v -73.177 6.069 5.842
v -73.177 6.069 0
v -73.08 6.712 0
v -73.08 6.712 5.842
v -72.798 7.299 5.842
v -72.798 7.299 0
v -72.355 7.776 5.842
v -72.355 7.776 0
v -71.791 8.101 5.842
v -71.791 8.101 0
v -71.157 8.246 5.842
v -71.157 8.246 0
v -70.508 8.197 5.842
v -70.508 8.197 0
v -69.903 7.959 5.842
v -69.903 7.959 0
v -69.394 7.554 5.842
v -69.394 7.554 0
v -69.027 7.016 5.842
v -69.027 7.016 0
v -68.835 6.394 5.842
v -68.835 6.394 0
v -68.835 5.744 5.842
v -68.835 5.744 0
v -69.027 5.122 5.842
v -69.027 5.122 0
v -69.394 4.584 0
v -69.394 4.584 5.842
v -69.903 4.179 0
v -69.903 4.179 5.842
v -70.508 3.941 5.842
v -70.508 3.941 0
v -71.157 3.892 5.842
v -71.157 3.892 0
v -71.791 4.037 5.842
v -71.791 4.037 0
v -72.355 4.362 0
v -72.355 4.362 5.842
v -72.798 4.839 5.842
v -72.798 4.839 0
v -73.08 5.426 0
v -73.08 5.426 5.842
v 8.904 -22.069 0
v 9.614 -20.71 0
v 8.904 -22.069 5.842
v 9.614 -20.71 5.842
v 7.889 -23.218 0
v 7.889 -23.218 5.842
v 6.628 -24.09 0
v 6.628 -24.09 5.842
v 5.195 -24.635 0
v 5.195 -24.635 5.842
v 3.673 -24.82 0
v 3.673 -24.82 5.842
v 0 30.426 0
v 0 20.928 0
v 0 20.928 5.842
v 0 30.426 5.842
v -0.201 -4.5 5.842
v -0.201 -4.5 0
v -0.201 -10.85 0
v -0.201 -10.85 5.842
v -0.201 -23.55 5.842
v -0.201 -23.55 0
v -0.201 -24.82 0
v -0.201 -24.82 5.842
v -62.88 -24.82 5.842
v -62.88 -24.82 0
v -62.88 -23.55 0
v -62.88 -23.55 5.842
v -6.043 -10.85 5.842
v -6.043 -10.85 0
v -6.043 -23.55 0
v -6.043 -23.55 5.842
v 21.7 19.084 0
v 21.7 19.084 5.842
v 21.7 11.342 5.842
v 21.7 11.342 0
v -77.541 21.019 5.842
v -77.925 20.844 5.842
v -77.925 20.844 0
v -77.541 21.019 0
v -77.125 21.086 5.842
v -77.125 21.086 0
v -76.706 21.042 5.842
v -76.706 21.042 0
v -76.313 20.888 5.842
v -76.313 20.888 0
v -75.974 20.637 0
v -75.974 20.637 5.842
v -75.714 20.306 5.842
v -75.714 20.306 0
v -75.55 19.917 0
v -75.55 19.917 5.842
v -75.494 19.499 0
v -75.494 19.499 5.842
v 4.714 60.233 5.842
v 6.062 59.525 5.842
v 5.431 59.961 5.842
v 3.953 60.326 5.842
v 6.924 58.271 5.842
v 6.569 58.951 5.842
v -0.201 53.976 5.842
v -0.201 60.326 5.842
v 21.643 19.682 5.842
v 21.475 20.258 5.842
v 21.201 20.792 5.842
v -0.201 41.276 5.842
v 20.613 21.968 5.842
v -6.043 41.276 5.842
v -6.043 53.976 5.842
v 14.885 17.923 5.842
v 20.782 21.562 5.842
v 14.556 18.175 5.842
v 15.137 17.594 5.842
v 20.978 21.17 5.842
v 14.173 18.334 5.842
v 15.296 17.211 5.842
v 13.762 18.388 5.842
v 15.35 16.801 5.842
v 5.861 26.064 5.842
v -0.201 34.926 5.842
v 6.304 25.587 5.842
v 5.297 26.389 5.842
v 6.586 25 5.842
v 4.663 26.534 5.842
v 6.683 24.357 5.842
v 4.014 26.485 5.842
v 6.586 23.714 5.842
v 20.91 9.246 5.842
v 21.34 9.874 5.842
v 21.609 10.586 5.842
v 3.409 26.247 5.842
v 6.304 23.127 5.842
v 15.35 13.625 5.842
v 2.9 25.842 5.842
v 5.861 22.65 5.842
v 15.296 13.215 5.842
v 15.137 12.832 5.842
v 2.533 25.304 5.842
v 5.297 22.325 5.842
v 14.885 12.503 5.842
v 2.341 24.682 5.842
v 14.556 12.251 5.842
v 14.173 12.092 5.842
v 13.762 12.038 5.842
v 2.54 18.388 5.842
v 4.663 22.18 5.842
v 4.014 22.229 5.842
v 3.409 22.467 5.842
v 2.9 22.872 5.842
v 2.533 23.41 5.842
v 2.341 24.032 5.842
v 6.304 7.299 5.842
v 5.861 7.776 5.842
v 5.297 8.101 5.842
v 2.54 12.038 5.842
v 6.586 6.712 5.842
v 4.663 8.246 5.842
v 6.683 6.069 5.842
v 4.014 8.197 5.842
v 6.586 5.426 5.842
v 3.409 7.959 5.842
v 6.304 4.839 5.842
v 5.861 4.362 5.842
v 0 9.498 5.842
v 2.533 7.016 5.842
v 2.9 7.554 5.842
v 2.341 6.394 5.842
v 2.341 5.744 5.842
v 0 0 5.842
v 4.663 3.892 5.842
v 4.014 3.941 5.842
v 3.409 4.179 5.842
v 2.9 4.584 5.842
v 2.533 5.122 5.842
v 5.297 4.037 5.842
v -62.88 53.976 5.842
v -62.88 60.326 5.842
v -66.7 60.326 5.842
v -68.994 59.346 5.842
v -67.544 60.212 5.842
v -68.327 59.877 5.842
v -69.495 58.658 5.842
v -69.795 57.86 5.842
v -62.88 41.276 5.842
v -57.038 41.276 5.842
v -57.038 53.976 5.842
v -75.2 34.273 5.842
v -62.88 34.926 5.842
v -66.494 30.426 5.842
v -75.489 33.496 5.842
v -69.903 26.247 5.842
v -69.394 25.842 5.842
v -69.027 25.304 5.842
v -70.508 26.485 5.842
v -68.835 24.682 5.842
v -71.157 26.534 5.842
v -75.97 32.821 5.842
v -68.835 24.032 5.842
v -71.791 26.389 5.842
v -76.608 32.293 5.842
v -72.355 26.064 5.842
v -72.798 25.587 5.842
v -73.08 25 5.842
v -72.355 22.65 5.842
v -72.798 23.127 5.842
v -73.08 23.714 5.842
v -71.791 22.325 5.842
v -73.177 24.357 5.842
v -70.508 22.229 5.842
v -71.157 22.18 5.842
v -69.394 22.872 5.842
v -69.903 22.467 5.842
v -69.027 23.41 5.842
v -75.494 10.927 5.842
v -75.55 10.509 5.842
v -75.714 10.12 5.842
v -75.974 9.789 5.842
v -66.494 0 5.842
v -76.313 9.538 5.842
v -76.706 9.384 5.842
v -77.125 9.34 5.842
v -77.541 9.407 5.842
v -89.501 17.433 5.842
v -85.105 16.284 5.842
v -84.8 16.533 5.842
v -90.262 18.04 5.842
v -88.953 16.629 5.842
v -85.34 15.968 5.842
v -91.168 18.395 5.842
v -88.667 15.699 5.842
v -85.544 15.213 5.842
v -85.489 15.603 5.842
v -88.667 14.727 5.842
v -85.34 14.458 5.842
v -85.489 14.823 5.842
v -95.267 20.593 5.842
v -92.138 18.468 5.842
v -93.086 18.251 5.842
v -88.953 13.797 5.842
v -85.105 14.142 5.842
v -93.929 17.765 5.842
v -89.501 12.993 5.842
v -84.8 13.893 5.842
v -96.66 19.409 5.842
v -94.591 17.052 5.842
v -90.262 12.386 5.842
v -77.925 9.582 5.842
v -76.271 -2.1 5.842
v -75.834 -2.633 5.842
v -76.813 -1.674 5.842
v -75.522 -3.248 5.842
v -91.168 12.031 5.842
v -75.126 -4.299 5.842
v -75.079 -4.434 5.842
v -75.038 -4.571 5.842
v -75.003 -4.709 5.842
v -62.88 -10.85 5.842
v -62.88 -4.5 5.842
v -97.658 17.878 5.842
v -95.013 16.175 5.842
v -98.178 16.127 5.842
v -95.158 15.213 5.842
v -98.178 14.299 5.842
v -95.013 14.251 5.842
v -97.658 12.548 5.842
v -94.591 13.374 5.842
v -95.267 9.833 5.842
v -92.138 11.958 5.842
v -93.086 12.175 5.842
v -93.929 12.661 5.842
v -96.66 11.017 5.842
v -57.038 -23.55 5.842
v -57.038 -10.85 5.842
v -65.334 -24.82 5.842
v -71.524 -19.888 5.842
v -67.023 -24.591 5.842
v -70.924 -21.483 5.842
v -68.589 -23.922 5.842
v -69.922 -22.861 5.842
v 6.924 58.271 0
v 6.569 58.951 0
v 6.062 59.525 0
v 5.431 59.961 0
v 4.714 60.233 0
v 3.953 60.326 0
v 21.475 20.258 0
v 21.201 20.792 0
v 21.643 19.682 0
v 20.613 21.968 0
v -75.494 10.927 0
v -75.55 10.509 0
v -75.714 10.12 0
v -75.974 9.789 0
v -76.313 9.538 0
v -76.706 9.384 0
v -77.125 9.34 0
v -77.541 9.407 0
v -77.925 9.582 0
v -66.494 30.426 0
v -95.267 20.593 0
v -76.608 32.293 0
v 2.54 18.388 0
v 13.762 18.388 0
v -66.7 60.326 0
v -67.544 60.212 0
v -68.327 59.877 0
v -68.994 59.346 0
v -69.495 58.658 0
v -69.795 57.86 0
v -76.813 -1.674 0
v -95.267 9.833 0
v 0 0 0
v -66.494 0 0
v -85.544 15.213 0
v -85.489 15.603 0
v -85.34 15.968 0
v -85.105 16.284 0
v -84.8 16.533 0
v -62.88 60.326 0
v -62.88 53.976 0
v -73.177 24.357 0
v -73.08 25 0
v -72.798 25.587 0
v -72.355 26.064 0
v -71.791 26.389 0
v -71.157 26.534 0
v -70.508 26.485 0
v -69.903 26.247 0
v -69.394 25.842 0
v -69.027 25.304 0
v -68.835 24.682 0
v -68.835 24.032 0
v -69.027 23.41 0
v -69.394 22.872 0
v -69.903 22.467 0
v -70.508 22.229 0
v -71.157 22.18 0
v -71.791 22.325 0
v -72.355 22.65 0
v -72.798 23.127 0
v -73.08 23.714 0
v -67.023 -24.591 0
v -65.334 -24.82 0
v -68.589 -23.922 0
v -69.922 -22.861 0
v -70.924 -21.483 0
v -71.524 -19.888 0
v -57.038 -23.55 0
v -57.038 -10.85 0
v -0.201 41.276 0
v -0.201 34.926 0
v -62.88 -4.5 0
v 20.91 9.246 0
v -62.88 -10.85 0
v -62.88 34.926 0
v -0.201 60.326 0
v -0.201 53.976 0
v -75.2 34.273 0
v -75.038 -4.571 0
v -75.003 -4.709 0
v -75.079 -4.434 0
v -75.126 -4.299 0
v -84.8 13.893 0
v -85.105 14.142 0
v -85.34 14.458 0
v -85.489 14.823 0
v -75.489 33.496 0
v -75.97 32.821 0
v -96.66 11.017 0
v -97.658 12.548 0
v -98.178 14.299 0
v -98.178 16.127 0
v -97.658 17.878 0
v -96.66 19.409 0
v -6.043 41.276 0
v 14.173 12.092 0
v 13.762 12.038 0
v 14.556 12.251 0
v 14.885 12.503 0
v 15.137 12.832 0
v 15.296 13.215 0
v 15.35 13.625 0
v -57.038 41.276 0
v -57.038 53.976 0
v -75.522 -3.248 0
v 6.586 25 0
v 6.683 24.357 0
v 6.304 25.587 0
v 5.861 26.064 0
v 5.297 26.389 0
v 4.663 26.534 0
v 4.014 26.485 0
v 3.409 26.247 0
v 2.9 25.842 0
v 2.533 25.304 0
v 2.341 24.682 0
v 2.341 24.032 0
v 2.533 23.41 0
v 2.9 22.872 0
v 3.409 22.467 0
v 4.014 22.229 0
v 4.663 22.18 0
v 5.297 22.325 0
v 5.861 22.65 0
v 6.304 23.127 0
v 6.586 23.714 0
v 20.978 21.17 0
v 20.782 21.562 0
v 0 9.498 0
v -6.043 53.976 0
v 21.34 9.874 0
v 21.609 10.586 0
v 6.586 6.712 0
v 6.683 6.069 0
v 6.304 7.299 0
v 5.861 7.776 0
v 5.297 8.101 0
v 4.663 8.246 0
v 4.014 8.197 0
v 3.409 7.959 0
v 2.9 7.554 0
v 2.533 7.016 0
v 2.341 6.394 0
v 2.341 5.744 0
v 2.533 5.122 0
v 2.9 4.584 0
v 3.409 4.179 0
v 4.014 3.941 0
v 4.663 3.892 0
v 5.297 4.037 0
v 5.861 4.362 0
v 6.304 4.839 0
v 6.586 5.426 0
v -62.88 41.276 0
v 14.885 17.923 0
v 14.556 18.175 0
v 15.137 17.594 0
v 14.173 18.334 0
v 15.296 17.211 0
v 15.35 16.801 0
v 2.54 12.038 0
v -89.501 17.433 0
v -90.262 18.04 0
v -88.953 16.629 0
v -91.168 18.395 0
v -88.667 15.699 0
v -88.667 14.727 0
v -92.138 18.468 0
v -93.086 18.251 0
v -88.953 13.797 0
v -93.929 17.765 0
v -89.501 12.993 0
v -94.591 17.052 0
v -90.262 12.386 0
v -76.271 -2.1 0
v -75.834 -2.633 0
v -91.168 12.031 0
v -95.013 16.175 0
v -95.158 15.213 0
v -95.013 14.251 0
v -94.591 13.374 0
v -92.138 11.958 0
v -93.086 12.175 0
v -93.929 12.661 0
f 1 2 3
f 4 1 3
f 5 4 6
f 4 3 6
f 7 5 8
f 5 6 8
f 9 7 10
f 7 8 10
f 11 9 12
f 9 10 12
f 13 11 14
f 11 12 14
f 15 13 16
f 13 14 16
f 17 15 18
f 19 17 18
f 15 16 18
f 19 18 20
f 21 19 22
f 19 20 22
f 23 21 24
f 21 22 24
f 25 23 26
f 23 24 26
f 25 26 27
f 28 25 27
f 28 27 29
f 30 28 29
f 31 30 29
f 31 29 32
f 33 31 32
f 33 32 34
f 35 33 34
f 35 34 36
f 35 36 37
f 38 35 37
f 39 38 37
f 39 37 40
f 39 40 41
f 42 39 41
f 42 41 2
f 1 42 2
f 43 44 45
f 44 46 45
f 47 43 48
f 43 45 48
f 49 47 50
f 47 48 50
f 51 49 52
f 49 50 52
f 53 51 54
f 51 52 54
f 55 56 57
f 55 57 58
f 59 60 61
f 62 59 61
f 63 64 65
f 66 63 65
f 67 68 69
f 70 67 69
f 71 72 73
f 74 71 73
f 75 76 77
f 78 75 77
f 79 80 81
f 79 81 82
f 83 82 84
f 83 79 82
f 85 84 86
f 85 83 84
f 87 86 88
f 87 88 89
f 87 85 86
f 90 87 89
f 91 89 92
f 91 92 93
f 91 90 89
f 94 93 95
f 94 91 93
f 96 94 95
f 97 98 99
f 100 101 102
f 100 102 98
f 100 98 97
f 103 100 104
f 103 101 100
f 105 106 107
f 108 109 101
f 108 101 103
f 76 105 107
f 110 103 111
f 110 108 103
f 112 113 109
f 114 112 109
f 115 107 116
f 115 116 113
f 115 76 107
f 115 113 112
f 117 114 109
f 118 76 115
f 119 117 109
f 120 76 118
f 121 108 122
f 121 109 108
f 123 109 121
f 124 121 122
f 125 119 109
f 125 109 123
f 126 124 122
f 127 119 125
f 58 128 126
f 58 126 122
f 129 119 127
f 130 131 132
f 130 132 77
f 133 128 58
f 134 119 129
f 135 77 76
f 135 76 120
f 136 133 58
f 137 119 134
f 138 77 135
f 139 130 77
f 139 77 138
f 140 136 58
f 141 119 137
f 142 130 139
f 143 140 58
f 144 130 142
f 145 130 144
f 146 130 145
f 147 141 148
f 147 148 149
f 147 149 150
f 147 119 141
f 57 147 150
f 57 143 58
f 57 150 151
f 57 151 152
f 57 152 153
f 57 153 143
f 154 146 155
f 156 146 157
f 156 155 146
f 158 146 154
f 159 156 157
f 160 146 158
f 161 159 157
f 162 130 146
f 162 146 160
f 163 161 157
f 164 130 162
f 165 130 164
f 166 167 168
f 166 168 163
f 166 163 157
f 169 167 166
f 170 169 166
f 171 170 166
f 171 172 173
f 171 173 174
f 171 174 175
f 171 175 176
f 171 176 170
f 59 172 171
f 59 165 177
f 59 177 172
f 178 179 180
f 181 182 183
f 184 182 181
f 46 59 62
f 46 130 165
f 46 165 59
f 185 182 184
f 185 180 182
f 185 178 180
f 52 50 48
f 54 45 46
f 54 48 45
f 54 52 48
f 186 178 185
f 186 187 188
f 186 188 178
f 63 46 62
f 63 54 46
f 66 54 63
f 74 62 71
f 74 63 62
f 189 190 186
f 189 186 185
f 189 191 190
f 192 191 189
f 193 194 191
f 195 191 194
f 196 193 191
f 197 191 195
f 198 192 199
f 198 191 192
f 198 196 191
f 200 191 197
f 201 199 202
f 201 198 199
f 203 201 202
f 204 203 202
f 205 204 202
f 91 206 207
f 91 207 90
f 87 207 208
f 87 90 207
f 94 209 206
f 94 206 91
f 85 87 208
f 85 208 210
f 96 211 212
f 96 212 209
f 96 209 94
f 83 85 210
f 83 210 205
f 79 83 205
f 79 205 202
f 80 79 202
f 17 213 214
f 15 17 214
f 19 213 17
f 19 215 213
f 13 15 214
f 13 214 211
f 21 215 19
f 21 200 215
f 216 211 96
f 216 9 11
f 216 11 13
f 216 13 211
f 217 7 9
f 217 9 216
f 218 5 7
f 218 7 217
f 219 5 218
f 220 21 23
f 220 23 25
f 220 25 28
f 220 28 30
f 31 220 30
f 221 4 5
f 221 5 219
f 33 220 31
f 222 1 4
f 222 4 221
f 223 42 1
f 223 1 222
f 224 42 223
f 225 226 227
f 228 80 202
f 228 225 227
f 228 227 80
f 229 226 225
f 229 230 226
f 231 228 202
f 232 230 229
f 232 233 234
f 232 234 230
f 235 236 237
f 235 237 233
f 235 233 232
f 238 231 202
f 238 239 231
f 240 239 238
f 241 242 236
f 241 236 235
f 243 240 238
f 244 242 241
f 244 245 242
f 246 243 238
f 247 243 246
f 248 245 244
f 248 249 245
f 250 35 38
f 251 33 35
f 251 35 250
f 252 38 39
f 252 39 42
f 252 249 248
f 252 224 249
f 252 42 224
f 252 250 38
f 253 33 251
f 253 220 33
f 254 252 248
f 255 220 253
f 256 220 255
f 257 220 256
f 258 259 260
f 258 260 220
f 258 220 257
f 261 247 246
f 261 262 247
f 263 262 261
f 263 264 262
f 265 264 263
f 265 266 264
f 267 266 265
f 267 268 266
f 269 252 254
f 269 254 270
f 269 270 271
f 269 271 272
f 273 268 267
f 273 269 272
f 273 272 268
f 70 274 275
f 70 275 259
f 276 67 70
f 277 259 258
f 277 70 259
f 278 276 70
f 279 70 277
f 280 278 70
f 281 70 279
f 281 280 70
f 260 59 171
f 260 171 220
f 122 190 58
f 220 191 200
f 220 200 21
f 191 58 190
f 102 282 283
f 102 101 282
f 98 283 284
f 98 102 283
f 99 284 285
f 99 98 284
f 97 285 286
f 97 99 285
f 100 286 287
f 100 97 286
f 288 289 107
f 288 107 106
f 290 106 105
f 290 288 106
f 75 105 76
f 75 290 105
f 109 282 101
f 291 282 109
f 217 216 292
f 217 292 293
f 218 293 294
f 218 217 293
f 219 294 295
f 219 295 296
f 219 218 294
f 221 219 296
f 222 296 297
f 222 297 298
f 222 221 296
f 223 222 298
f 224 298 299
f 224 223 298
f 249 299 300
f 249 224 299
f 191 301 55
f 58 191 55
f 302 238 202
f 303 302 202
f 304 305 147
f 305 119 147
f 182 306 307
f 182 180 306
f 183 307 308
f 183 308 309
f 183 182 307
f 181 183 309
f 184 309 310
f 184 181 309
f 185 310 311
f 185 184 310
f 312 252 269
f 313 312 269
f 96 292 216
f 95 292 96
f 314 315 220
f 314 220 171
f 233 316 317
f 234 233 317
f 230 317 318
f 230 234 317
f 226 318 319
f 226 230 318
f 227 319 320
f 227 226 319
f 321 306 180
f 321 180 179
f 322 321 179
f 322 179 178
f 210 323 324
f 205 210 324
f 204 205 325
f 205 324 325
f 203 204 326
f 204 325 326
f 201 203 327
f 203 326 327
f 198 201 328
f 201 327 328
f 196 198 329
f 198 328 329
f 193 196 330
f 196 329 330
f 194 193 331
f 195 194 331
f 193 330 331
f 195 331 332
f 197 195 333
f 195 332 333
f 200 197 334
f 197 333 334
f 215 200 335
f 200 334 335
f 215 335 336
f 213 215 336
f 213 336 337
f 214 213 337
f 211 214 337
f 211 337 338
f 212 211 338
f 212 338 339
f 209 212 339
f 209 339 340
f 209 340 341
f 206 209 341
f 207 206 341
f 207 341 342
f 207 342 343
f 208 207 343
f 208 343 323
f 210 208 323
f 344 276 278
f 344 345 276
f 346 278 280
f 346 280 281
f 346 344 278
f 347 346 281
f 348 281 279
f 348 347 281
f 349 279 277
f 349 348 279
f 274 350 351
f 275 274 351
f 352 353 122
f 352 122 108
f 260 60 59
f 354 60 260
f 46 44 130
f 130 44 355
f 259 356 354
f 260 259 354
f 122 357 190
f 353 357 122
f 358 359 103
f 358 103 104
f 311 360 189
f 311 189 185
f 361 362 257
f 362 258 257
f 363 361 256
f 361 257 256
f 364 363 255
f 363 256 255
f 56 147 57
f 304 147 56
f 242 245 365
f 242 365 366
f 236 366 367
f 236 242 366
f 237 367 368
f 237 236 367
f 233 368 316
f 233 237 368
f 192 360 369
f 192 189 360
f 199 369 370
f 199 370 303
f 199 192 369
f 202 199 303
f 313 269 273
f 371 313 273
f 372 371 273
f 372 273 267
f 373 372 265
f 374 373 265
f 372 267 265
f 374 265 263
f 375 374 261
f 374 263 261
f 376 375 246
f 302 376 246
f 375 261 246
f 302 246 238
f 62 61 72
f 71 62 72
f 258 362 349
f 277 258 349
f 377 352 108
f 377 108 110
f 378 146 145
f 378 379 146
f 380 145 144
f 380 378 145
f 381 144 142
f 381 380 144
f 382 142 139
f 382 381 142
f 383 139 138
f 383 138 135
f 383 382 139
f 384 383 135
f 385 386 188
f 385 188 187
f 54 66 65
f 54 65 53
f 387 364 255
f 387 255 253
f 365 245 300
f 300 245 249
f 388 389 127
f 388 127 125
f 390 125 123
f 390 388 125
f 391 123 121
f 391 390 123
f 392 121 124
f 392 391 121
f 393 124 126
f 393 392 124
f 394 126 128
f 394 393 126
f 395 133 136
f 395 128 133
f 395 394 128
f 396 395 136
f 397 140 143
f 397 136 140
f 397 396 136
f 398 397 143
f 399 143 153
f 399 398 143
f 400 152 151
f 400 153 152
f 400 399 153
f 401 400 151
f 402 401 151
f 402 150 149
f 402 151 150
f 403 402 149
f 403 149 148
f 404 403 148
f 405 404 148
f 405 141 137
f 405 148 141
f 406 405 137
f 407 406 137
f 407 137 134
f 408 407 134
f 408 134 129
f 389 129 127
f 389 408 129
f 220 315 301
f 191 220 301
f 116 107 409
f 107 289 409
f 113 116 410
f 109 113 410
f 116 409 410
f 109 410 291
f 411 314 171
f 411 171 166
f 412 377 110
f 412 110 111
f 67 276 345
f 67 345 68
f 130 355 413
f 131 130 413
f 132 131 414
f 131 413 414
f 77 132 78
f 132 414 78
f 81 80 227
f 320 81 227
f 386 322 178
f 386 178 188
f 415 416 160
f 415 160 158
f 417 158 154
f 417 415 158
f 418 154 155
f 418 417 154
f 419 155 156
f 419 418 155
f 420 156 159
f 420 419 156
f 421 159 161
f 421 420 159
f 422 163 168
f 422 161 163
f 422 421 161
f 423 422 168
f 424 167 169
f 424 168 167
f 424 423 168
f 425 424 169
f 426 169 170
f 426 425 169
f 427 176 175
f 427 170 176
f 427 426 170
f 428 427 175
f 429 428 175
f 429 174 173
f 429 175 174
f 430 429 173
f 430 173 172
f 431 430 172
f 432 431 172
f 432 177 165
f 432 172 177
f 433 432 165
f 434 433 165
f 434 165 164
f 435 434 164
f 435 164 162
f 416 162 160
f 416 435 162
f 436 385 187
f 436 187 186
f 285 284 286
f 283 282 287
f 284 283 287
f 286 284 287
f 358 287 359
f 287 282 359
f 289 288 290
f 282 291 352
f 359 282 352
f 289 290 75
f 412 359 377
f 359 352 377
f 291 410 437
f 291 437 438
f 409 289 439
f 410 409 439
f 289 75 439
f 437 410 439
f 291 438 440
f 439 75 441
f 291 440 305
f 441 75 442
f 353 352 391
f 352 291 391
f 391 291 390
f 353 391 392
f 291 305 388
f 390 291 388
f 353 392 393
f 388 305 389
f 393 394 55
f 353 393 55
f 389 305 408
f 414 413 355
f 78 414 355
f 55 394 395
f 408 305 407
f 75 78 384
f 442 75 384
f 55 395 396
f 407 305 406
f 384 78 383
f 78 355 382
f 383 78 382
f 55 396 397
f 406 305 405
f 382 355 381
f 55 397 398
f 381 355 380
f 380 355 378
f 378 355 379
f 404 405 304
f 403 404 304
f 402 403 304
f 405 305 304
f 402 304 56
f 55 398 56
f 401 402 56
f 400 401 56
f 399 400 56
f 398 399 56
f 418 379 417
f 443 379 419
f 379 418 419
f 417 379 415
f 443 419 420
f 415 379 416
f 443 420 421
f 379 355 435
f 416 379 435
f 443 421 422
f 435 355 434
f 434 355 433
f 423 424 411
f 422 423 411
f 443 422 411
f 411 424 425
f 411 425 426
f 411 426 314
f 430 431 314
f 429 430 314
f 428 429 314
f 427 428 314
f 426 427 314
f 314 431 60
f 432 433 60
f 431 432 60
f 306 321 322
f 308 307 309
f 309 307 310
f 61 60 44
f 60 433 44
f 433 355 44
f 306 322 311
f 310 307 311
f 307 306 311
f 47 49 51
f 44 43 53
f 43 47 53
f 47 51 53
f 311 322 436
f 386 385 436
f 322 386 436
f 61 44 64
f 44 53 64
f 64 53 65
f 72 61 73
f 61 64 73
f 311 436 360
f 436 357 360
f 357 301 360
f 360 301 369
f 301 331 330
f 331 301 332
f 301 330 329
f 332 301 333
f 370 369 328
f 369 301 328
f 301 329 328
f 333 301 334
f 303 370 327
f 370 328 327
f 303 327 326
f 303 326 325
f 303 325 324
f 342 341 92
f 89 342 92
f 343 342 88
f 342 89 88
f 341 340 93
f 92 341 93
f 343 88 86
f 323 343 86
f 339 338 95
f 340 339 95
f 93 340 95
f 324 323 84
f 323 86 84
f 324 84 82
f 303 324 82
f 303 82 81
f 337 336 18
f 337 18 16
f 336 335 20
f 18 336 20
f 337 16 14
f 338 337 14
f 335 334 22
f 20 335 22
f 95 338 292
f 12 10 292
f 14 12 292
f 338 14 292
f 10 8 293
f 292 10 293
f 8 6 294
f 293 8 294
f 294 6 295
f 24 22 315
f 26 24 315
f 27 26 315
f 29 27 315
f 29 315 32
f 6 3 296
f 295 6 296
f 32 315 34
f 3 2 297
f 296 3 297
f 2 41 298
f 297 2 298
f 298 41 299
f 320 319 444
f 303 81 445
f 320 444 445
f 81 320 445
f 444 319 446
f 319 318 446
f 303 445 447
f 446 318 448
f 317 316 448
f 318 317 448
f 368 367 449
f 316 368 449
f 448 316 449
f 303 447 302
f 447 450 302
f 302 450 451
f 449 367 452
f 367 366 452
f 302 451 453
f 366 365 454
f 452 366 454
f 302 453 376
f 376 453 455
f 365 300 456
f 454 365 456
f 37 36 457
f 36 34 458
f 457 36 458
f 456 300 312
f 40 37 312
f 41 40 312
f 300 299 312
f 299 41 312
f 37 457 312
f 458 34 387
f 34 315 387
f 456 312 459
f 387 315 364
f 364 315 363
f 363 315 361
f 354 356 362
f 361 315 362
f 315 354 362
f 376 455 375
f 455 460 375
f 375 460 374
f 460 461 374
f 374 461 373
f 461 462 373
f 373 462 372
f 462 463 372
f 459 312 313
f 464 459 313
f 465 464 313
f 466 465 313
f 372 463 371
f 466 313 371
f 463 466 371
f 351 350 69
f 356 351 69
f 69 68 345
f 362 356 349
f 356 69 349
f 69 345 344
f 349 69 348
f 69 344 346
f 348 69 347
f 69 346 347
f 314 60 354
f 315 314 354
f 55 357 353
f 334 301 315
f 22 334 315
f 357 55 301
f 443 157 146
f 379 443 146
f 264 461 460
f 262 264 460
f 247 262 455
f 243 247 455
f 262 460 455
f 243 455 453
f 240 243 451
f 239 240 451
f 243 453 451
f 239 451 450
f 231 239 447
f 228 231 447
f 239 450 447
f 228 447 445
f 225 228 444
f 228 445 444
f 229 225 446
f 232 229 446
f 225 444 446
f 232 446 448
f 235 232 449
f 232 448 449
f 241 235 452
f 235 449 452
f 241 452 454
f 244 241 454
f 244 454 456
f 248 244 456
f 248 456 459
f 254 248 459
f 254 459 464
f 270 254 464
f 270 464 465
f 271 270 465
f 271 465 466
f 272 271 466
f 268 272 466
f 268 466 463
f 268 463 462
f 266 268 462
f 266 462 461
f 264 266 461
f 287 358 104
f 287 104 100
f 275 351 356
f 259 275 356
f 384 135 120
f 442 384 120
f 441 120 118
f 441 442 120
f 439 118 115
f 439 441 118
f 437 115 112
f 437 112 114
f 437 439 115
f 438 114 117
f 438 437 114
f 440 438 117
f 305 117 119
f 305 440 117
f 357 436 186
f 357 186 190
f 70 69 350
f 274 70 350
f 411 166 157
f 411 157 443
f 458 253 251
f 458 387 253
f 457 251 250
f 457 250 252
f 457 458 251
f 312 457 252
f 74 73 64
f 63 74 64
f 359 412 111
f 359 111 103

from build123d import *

# Parameters (mm, degrees)
SKETCH1_W                        = 66.494000054
SKETCH1_H                        = 30.426
BOSS_EXTRUDE1_DEPTH              = 5.842
F_11_64_0_17188_DIAMETER_HOLE1_D = 4.365752
F_0_257_DIAMETER_HOLE1_D         = 6.5278
BOSS_EXTRUDE3_DEPTH              = 5.842
F_0_257_DIAMETER_HOLE3_D         = 6.5278
SKETCH13_W                       = 8.999982
SKETCH13_H                       = 6.35
CUT_EXTRUDE1_DEPTH               = 105.431017222
CHAMFER1_SIZE                    = 2.54
BOSS_EXTRUDE6_DEPTH              = 5.842
FILLET1_R                        = 3.175
FILLET2_R                        = 1.5875
FILLET3_R                        = 1.5875
BOSS_EXTRUDE7_DEPTH              = 5.842
FILLET4_R                        = 3.175
FILLET5_R                        = 6.35
FILLET6_R                        = 3.175
CUT_EXTRUDE3_DEPTH               = 116.434993398
CUT_EXTRUDE4_DEPTH               = 116.434993398
FILLET10_R                       = 3.175
SKETCH29_W                       = 87.204685613
SKETCH29_H                       = 5.08
CUT_EXTRUDE6_DEPTH               = 116.434993398
FILLET12_R                       = 6.35


with BuildPart() as part:
    # Sketch1 → Boss-Extrude1 (new body)
    with BuildSketch(Plane.XY):
        with BuildLine():
            Line((-75.493982054, 0), (-75.493982054, 30.426))
            ThreePointArc((-75.493982054, 30.426), (-74.175965205, 33.607974151), (-70.993991054, 34.925991))
            Line((-70.993991054, 34.925991), (4.499991, 34.925991))
            ThreePointArc((4.499991, 34.925991), (7.681965151, 33.607974151), (8.999982, 30.426))
            Line((8.999982, 30.426), (8.999982, 0))
            Line((8.999982, 0), (11.100760908, -11.565106481))
            ThreePointArc((11.100760908, -11.565106481), (7.160083484, -18.61606843), (-0.513638035, -16.094362457))
            Line((-0.513638035, -16.094362457), (-7.847000027, -4.499991))
            Line((-7.847000027, -4.499991), (-58.647000027, -4.499991))
            Line((-58.647000027, -4.499991), (-65.980362019, -16.094362457))
            ThreePointArc((-65.980362019, -16.094362457), (-73.654083538, -18.61606843), (-77.594760962, -11.565106481))
            Line((-77.594760962, -11.565106481), (-75.493982054, 0))
        make_face()
        with Locations((-33.247000027, 15.213)):
            Rectangle(SKETCH1_W, SKETCH1_H, mode=Mode.SUBTRACT)
    extrude(amount=BOSS_EXTRUDE1_DEPTH)

    # 11/64 (0.17188) Diameter Hole1 (through all)
    with Locations(Plane.XY.offset(5.842)):
        with Locations((-70.993991054, 24.357), (-70.993991054, 6.069)):
            f_11_64_0_17188_diameter_hole1 = Hole(F_11_64_0_17188_DIAMETER_HOLE1_D / 2)

    # Mirror1: 11/64 (0.17188) Diameter Hole1 across plane
    add(f_11_64_0_17188_diameter_hole1.mirror(Plane.ZY.offset(33.247000027)), mode=Mode.SUBTRACT)

    # F (0.257) Diameter Hole1 (through all)
    with Locations(Plane.XY.offset(5.842)):
        with Locations((-71.347000027, -12.7)):
            f_0_257_diameter_hole1 = Hole(F_0_257_DIAMETER_HOLE1_D / 2)

    # Mirror2: F (0.257) Diameter Hole1 across plane
    add(f_0_257_diameter_hole1.mirror(Plane.ZY.offset(33.247000027)), mode=Mode.SUBTRACT)

    # Sketch10 → Boss-Extrude3 (add)
    with BuildSketch(Plane.XY.offset(5.842)):
        with BuildLine():
            Line((-95.26734363, 20.592874824), (-73.384544712, 34.314048933))
            Line((-73.384544712, 34.314048933), (-68.603437396, 34.314048933))
            Line((-68.603437396, 34.314048933), (-75.493982054, 30.426))
            Line((-75.493982054, 30.426), (-75.493982054, 22.368465679))
            Line((-75.493982054, 22.368465679), (-85.597223399, 16.03342901))
            ThreePointArc((-85.597223399, 16.03342901), (-85.544000054, 15.213), (-85.597223399, 14.39257099))
            Line((-85.597223399, 14.39257099), (-75.493982054, 8.057534321))
            Line((-75.493982054, 8.057534321), (-75.493982054, 0))
            Line((-75.493982054, 0), (-75.901345831, -2.242599371))
            Line((-75.901345831, -2.242599371), (-95.26734363, 9.833125176))
            ThreePointArc((-95.26734363, 9.833125176), (-98.244000054, 15.213), (-95.26734363, 20.592874824))
        make_face()
    extrude(amount=-BOSS_EXTRUDE3_DEPTH)

    # F (0.257) Diameter Hole3 (through all)
    with Locations(Plane.XY.offset(5.842)):
        with Locations((-91.894000054, 15.213)):
            Hole(F_0_257_DIAMETER_HOLE3_D / 2)

    # Sketch13 → Cut-Extrude1 (cut, through all)
    with BuildSketch(Plane.XY.offset(5.842)):
        with Locations((4.499991, 15.213)):
            Rectangle(SKETCH13_W, SKETCH13_H)
    extrude(amount=-CUT_EXTRUDE1_DEPTH, mode=Mode.SUBTRACT)

    # Chamfer1
    chamfer1_edges = [part.edges().sort_by_distance(p)[0] for p in [
        (0, 12.038, 2.921),
        (0, 18.388, 2.921),
    ]]
    chamfer(chamfer1_edges, length=CHAMFER1_SIZE)

    # Sketch22 → Boss-Extrude6 (add)
    with BuildSketch(Plane.XY.offset(5.842)):
        Polygon((8.999982, 18.388), (8.999982, 24.738), (21.699982, 21.563), (21.699982, 8.863), (8.999982, 5.688), (8.999982, 12.038), (15.349982, 12.038), (15.349982, 18.388), align=None)
    extrude(amount=-BOSS_EXTRUDE6_DEPTH)

    # Fillet1
    fillet1_edges = [part.edges().sort_by_distance(p)[0] for p in [
        (8.999982, 24.738, 2.921),
        (21.699982, 21.563, 2.921),
        (21.699982, 8.863, 2.921),
        (8.999982, 5.688, 2.921),
    ]]
    fillet(fillet1_edges, radius=FILLET1_R)

    # Fillet2
    fillet2_edges = [part.edges().sort_by_distance(p)[0] for p in [
        (15.349982, 18.388, 2.921),
        (15.349982, 12.038, 2.921),
    ]]
    fillet(fillet2_edges, radius=FILLET2_R)

    # Fillet3
    # the kernel refuses this fillet: 1.5875 mm, written as the material it adds along each edge
    with BuildSketch(Plane(origin=(-75.493982054, 8.057534321, 5.842), x_dir=(0, 1, 0), z_dir=(0, 0, -1))) as fillet3_piece_1:
        with BuildLine():
            CenterArc((FILLET3_R * 1.80735498388, -FILLET3_R), FILLET3_R, 90, 122.088950954)
            Line((FILLET3_R * 0.960130602163, -FILLET3_R * 1.53123520876), (0, 0))
            Line((0, 0), (FILLET3_R * 1.80735498388, 0))
        make_face()
    extrude(amount=5.842)
    with BuildSketch(Plane(origin=(-75.493982054, 22.368465679, 5.842), x_dir=(0, -1, 0), z_dir=(0, 0, -1))) as fillet3_piece_2:
        with BuildLine():
            CenterArc((FILLET3_R * 1.80735498388, FILLET3_R), FILLET3_R, 147.911049046, 122.088950954)
            Line((FILLET3_R * 0.960130602163, FILLET3_R * 1.53123520876), (0, 0))
            Line((0, 0), (FILLET3_R * 1.80735498388, 0))
        make_face()
    extrude(amount=5.842)
    with BuildSketch(Plane(origin=(-85.597223399, 14.39257099, 5.842), x_dir=(0.06319147380474219, 0.9980014216615047, 0), z_dir=(0, 0, -1))) as fillet3_piece_3:
        with BuildLine():
            CenterArc((0.946995123, 1.584009043), FILLET3_R, 208.465932253, 57.73363863)
            Line((-0.448577196, 0.827349177), (0, 0))
            ThreePointArc((0, 0), (0.420886721, 0.013963828), (0.841773443, 0))
        make_face()
    extrude(amount=5.842)
    with BuildSketch(Plane(origin=(-85.597223399, 16.03342901, 5.842), x_dir=(0.8472243817163825, 0.5312352087590706, 0), z_dir=(0, 0, -1))) as fillet3_piece_4:
        with BuildLine():
            CenterArc((0.94113132, 1.5875), FILLET3_R, 212.26636137, 57.73363863)
            ThreePointArc((-0.401219641, 0.7400036), (-0.18833421, 0.376657465), (0, 0))
            Line((0, 0), (0.94113132, 0))
        make_face()
    extrude(amount=5.842)

    # Sketch24 → Boss-Extrude7 (add)
    with BuildSketch(Plane(origin=(0, 0, 0), x_dir=(-1, 0, 0), z_dir=(0, 0, -1))):
        Polygon((57.037580054, 48.794391), (57.037580054, 41.275991), (62.879580054, 41.275991), (62.879580054, 34.925991), (70.993991054, 34.925991), (73.259602339, 34.314048933), (73.384544712, 34.314048933), (75.493982054, 32.991368176), (69.229580054, 60.325991), (62.879580054, 60.325991), (62.879580054, 53.975991), (57.037580054, 53.975991), align=None)
        Polygon((0.200579946, 60.325991), (-6.149420054, 60.325991), (-21.699982, 19.08403491), (-9.699273994, 22.99974755), (0.200579946, 34.925991), (0.200579946, 41.275991), (6.042579946, 41.275991), (6.042579946, 48.794391), (6.042579946, 53.975991), (0.200579946, 53.975991), align=None)
    boss_extrude7 = extrude(amount=-BOSS_EXTRUDE7_DEPTH)

    # Fillet4
    fillet4_edges = [part.edges().sort_by_distance(p)[0] for p in [
        (-75.493982054, 32.991368176, 2.921),
        (-69.229580054, 60.325991, 2.921),
    ]]
    fillet(fillet4_edges, radius=FILLET4_R)

    # Fillet5
    fillet5_edges = [part.edges().sort_by_distance(p)[0] for p in [
        (20.909565621, 21.180313983, 2.921),
    ]]
    fillet(fillet5_edges, radius=FILLET5_R)

    # Fillet6
    fillet6_edges = [part.edges().sort_by_distance(p)[0] for p in [
        (6.149420054, 60.325991, 2.921),
    ]]
    fillet(fillet6_edges, radius=FILLET6_R)

    # Sketch26 → Cut-Extrude3 (cut, through all)
    with BuildSketch(Plane(origin=(0, 0, 0), x_dir=(-1, 0, 0), z_dir=(0, 0, -1))):
        Polygon((89.149059257, -30.603913947), (-16.445159676, -30.603913947), (-16.445159676, -4.499991), (-16.445159676, 1.604517455), (-8.999982, 1.604517455), (-8.999982, -4.499991), (75.901345831, -4.499991), (75.901345831, -2.242599371), (89.149059257, -2.242599371), (89.149059257, -4.499991), align=None)
    extrude(amount=-CUT_EXTRUDE3_DEPTH, mode=Mode.SUBTRACT)

    # Mirror3: Boss-Extrude7 across plane
    add(boss_extrude7.mirror(Plane(origin=(0, 15.213, 0), x_dir=(0, 0, 1), z_dir=(0, -1, 0))))

    # Sketch28 → Cut-Extrude4 (cut, through all)
    with BuildSketch(Plane(origin=(0, 0, 0), x_dir=(-1, 0, 0), z_dir=(0, 0, -1))):
        Polygon((75.050615589, -4.499991), (75.901345831, -2.242599371), (75.901345831, -4.499991), align=None)
    extrude(amount=-CUT_EXTRUDE4_DEPTH, mode=Mode.SUBTRACT)

    # Fillet10
    fillet10_edges = [part.edges().sort_by_distance(p)[0] for p in [
        (6.149420054, -29.899991, 2.921),
        (-75.050615589, -4.499991, 2.921),
        (-69.229580054, -29.899991, 2.921),
        (-75.901345831, -2.242599371, 2.921),
    ]]
    fillet(fillet10_edges, radius=FILLET10_R)

    # Sketch29 → Cut-Extrude6 (cut, through all)
    with BuildSketch(Plane.XY.offset(5.842)):
        with Locations((-32.135383003, -27.359991)):
            Rectangle(SKETCH29_W, SKETCH29_H)
    extrude(amount=-CUT_EXTRUDE6_DEPTH, mode=Mode.SUBTRACT)

    # Fillet12
    fillet12_edges = [part.edges().sort_by_distance(p)[0] for p in [
        (8.064868839, -24.819991, 2.921),
        (-70.393787161, -24.819991, 2.921),
    ]]
    fillet(fillet12_edges, radius=FILLET12_R)


solid = part.part
